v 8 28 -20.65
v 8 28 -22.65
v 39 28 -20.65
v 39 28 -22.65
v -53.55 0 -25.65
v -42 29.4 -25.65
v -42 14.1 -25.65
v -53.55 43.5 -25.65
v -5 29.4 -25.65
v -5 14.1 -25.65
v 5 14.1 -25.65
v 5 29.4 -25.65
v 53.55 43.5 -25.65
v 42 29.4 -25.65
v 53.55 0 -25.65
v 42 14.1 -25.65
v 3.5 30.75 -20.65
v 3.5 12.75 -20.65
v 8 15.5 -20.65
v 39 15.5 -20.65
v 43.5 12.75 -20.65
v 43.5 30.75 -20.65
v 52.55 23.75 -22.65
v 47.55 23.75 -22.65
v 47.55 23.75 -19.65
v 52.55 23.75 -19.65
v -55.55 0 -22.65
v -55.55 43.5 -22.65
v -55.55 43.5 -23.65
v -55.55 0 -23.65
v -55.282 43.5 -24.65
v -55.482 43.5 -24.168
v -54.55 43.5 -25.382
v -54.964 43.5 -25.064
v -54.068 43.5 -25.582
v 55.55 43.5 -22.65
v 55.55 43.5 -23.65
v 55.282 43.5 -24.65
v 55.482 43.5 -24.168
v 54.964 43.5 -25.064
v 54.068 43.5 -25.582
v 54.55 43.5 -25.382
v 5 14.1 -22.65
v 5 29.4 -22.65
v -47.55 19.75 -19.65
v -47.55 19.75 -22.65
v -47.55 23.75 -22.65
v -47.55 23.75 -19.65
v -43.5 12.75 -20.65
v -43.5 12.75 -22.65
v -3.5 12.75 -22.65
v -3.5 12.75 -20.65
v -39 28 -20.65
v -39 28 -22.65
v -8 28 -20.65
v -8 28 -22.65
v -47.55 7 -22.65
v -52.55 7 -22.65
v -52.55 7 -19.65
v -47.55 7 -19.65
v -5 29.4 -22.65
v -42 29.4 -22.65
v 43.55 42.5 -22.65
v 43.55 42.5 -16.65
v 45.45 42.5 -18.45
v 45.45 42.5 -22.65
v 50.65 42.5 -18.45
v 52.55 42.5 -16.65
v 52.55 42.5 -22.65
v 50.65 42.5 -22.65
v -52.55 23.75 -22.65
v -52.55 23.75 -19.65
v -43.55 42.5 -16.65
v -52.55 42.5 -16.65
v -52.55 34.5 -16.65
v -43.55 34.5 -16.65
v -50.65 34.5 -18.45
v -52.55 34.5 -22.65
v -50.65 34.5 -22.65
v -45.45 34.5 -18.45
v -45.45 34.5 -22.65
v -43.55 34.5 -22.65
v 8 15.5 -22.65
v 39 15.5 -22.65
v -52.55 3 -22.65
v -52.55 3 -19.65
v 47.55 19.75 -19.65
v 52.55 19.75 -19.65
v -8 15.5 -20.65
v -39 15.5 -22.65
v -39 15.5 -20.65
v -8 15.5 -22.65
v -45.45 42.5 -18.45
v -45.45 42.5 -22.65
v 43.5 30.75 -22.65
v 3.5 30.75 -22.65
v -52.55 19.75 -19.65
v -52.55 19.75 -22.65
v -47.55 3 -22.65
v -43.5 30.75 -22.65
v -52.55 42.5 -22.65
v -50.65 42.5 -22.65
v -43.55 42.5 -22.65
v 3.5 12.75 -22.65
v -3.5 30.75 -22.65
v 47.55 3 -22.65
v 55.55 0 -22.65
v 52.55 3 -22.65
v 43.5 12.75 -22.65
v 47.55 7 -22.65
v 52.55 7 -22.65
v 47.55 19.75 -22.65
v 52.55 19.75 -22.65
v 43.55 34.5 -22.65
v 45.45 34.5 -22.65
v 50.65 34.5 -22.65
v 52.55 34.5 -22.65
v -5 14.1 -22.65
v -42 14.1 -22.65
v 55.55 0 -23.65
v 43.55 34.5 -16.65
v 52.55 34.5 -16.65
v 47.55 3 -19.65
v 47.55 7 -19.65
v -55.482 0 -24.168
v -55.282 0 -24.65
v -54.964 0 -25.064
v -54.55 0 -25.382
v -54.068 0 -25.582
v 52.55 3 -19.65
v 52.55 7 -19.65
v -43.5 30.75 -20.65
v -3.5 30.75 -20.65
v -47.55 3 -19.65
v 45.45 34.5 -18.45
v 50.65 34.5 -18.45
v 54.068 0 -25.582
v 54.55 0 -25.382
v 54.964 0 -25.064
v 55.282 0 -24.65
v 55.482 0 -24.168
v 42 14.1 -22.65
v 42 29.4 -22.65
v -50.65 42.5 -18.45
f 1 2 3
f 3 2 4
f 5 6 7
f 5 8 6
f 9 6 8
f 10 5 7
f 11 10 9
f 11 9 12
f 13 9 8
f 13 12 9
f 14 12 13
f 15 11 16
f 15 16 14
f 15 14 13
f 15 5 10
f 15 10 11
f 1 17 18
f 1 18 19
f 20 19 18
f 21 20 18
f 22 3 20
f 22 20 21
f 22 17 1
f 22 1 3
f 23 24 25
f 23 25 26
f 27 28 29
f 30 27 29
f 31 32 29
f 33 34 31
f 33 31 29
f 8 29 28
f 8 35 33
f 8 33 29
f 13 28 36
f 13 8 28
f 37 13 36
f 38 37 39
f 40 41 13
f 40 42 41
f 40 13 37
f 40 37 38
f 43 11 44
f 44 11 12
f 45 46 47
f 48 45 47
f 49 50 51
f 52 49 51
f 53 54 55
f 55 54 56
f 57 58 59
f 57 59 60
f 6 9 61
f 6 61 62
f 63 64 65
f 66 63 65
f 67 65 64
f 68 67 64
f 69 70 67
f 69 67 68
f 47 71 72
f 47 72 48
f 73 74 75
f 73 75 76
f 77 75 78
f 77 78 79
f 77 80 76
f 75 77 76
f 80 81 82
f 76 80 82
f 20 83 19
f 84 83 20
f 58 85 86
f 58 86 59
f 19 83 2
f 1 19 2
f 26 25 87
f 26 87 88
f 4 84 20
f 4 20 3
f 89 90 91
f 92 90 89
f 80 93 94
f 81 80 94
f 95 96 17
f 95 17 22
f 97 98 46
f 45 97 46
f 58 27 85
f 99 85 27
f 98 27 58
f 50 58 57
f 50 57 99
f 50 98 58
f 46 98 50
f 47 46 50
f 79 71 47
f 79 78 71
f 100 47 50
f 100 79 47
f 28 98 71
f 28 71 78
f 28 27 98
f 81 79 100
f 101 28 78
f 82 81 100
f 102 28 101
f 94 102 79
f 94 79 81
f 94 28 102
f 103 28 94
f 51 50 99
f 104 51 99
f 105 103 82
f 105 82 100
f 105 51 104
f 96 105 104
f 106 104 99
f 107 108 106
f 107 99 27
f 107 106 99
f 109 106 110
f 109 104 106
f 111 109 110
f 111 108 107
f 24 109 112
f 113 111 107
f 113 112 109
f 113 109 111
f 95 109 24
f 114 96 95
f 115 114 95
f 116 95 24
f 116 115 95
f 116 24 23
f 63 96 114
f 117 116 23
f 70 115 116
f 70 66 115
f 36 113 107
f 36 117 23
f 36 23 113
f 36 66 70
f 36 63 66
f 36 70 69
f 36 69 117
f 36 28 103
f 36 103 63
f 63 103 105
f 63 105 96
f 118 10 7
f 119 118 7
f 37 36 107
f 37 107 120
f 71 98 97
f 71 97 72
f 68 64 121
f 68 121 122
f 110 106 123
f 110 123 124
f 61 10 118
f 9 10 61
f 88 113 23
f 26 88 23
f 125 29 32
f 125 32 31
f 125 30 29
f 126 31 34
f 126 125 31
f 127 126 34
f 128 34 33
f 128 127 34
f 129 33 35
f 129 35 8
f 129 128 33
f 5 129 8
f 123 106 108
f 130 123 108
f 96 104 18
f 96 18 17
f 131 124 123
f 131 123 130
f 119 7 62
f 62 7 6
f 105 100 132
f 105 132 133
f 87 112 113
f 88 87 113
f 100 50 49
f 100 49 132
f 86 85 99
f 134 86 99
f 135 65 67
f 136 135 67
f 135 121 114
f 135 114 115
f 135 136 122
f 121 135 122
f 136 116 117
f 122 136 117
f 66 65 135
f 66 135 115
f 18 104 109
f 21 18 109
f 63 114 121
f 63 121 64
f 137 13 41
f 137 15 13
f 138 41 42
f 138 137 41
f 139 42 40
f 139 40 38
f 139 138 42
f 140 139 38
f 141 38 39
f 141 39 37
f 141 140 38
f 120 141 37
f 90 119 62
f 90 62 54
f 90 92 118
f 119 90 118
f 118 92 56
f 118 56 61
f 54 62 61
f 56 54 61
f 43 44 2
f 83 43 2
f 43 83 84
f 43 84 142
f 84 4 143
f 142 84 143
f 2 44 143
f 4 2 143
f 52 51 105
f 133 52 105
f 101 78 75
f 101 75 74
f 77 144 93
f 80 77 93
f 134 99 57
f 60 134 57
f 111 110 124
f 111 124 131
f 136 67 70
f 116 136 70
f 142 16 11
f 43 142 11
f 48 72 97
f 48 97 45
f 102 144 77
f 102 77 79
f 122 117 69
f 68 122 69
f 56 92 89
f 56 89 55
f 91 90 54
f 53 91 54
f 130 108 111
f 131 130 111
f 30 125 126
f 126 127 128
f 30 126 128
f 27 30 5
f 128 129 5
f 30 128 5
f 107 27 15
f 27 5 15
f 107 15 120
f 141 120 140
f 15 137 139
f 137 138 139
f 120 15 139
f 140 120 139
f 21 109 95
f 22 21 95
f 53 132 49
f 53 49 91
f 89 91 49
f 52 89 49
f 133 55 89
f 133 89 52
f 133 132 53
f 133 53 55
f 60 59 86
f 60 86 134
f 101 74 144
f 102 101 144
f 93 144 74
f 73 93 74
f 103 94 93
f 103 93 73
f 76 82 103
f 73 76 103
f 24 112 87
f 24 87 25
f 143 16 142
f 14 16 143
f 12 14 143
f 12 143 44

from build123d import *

# Parameters (mm, degrees)
SKETCH1_W           = 111.1
SKETCH1_H           = 51.3
BOSS_EXTRUDE1_DEPTH = 3
SKETCH2_W           = 111.1
SKETCH2_H           = 51.3
SKETCH2_W_2         = 105.3
SKETCH2_H_2         = 45.3
BOSS_EXTRUDE2_DEPTH = 40.5
SKETCH10_W          = 126.244554882
SKETCH10_H          = 68.697179438
CUT_EXTRUDE2_DEPTH  = 53
SKETCH11_W          = 5
SKETCH11_H          = 4
BOSS_EXTRUDE7_DEPTH = 3
SKETCH12_W          = 9
SKETCH12_H          = 8
BOSS_EXTRUDE8_DEPTH = 6
SKETCH13_W          = 5.2
SKETCH13_H          = 4.2
CUT_EXTRUDE3_DEPTH  = 12
FILLET2_R           = 2
SKETCH5_W           = 37
SKETCH5_H           = 15.3
CUT_EXTRUDE5_DEPTH  = 3
SKETCH15_W          = 40
SKETCH15_H          = 18
SKETCH15_W_2        = 31
SKETCH15_H_2        = 12.5
BOSS_EXTRUDE9_DEPTH = 2


with BuildPart() as part:
    # Sketch1 → Boss-Extrude1 (new body)
    with BuildSketch(Plane(origin=(0, 0, 0), x_dir=(1, 0, 0), z_dir=(0, 1, 0))):
        Rectangle(SKETCH1_W, SKETCH1_H)
    extrude(amount=BOSS_EXTRUDE1_DEPTH)

    # Sketch2 → Boss-Extrude2 (add)
    with BuildSketch(Plane(origin=(0, 3, 0), x_dir=(1, 0, 0), z_dir=(0, 1, 0))):
        Rectangle(SKETCH2_W, SKETCH2_H)
        Rectangle(SKETCH2_W_2, SKETCH2_H_2, mode=Mode.SUBTRACT)
    extrude(amount=BOSS_EXTRUDE2_DEPTH)

    # Sketch10 → Cut-Extrude2 (cut)
    with BuildSketch(Plane.XY.offset(-22.65)):
        with Locations((0, 21.75)):
            Rectangle(SKETCH10_W, SKETCH10_H)
    extrude(amount=CUT_EXTRUDE2_DEPTH, mode=Mode.SUBTRACT)

    # Sketch11 → Boss-Extrude7 (add)
    with BuildSketch(Plane.XY.offset(-22.65)):
        with Locations((-50.05, 21.75)):
            Rectangle(SKETCH11_W, SKETCH11_H)
        with Locations((-50.05, 5)):
            Rectangle(SKETCH11_W, SKETCH11_H)
        with Locations((50.05, 5)):
            Rectangle(SKETCH11_W, SKETCH11_H)
        with Locations((50.05, 21.75)):
            Rectangle(SKETCH11_W, SKETCH11_H)
    extrude(amount=BOSS_EXTRUDE7_DEPTH)

    # Sketch12 → Boss-Extrude8 (add)
    with BuildSketch(Plane.XY.offset(-22.65)):
        with Locations((-48.05, 38.5)):
            Rectangle(SKETCH12_W, SKETCH12_H)
        with Locations((48.05, 38.5)):
            Rectangle(SKETCH12_W, SKETCH12_H)
    extrude(amount=BOSS_EXTRUDE8_DEPTH)

    # Sketch13 → Cut-Extrude3 (cut)
    with BuildSketch(Plane(origin=(0, 42.5, 0), x_dir=(1, 0, 0), z_dir=(0, 1, 0))):
        with Locations((-48.05, 20.55)):
            Rectangle(SKETCH13_W, SKETCH13_H)
        with Locations((48.05, 20.55)):
            Rectangle(SKETCH13_W, SKETCH13_H)
    extrude(amount=-CUT_EXTRUDE3_DEPTH, mode=Mode.SUBTRACT)

    # Fillet2
    fillet2_edges = [part.edges().sort_by_distance(p)[0] for p in [
        (-55.55, 21.75, -25.65),
        (55.55, 21.75, -25.65),
    ]]
    fillet(fillet2_edges, radius=FILLET2_R)

    # Sketch5 → Cut-Extrude5 (cut)
    with BuildSketch(Plane(origin=(0, 0, -25.65), x_dir=(-1, 0, 0), z_dir=(0, 0, -1))):
        with Locations((23.5, 21.75)):
            Rectangle(SKETCH5_W, SKETCH5_H)
        with Locations((-23.5, 21.75)):
            Rectangle(SKETCH5_W, SKETCH5_H)
    extrude(amount=-CUT_EXTRUDE5_DEPTH, mode=Mode.SUBTRACT)

    # Sketch15 → Boss-Extrude9 (add)
    # profile 1 of 2: a face of its own
    with BuildSketch(Plane.XY.offset(-22.65)):
        with Locations((23.5, 21.75)):
            Rectangle(SKETCH15_W, SKETCH15_H)
        with Locations((23.5, 21.75)):
            Rectangle(SKETCH15_W_2, SKETCH15_H_2, mode=Mode.SUBTRACT)
    # profile 2 of 2: a face of its own
    with BuildSketch(Plane.XY.offset(-22.65)):
        with Locations((-23.5, 21.75)):
            Rectangle(SKETCH15_W, SKETCH15_H)
        with Locations((-23.5, 21.75)):
            Rectangle(SKETCH15_W_2, SKETCH15_H_2, mode=Mode.SUBTRACT)
    extrude(amount=BOSS_EXTRUDE9_DEPTH)


solid = part.part
